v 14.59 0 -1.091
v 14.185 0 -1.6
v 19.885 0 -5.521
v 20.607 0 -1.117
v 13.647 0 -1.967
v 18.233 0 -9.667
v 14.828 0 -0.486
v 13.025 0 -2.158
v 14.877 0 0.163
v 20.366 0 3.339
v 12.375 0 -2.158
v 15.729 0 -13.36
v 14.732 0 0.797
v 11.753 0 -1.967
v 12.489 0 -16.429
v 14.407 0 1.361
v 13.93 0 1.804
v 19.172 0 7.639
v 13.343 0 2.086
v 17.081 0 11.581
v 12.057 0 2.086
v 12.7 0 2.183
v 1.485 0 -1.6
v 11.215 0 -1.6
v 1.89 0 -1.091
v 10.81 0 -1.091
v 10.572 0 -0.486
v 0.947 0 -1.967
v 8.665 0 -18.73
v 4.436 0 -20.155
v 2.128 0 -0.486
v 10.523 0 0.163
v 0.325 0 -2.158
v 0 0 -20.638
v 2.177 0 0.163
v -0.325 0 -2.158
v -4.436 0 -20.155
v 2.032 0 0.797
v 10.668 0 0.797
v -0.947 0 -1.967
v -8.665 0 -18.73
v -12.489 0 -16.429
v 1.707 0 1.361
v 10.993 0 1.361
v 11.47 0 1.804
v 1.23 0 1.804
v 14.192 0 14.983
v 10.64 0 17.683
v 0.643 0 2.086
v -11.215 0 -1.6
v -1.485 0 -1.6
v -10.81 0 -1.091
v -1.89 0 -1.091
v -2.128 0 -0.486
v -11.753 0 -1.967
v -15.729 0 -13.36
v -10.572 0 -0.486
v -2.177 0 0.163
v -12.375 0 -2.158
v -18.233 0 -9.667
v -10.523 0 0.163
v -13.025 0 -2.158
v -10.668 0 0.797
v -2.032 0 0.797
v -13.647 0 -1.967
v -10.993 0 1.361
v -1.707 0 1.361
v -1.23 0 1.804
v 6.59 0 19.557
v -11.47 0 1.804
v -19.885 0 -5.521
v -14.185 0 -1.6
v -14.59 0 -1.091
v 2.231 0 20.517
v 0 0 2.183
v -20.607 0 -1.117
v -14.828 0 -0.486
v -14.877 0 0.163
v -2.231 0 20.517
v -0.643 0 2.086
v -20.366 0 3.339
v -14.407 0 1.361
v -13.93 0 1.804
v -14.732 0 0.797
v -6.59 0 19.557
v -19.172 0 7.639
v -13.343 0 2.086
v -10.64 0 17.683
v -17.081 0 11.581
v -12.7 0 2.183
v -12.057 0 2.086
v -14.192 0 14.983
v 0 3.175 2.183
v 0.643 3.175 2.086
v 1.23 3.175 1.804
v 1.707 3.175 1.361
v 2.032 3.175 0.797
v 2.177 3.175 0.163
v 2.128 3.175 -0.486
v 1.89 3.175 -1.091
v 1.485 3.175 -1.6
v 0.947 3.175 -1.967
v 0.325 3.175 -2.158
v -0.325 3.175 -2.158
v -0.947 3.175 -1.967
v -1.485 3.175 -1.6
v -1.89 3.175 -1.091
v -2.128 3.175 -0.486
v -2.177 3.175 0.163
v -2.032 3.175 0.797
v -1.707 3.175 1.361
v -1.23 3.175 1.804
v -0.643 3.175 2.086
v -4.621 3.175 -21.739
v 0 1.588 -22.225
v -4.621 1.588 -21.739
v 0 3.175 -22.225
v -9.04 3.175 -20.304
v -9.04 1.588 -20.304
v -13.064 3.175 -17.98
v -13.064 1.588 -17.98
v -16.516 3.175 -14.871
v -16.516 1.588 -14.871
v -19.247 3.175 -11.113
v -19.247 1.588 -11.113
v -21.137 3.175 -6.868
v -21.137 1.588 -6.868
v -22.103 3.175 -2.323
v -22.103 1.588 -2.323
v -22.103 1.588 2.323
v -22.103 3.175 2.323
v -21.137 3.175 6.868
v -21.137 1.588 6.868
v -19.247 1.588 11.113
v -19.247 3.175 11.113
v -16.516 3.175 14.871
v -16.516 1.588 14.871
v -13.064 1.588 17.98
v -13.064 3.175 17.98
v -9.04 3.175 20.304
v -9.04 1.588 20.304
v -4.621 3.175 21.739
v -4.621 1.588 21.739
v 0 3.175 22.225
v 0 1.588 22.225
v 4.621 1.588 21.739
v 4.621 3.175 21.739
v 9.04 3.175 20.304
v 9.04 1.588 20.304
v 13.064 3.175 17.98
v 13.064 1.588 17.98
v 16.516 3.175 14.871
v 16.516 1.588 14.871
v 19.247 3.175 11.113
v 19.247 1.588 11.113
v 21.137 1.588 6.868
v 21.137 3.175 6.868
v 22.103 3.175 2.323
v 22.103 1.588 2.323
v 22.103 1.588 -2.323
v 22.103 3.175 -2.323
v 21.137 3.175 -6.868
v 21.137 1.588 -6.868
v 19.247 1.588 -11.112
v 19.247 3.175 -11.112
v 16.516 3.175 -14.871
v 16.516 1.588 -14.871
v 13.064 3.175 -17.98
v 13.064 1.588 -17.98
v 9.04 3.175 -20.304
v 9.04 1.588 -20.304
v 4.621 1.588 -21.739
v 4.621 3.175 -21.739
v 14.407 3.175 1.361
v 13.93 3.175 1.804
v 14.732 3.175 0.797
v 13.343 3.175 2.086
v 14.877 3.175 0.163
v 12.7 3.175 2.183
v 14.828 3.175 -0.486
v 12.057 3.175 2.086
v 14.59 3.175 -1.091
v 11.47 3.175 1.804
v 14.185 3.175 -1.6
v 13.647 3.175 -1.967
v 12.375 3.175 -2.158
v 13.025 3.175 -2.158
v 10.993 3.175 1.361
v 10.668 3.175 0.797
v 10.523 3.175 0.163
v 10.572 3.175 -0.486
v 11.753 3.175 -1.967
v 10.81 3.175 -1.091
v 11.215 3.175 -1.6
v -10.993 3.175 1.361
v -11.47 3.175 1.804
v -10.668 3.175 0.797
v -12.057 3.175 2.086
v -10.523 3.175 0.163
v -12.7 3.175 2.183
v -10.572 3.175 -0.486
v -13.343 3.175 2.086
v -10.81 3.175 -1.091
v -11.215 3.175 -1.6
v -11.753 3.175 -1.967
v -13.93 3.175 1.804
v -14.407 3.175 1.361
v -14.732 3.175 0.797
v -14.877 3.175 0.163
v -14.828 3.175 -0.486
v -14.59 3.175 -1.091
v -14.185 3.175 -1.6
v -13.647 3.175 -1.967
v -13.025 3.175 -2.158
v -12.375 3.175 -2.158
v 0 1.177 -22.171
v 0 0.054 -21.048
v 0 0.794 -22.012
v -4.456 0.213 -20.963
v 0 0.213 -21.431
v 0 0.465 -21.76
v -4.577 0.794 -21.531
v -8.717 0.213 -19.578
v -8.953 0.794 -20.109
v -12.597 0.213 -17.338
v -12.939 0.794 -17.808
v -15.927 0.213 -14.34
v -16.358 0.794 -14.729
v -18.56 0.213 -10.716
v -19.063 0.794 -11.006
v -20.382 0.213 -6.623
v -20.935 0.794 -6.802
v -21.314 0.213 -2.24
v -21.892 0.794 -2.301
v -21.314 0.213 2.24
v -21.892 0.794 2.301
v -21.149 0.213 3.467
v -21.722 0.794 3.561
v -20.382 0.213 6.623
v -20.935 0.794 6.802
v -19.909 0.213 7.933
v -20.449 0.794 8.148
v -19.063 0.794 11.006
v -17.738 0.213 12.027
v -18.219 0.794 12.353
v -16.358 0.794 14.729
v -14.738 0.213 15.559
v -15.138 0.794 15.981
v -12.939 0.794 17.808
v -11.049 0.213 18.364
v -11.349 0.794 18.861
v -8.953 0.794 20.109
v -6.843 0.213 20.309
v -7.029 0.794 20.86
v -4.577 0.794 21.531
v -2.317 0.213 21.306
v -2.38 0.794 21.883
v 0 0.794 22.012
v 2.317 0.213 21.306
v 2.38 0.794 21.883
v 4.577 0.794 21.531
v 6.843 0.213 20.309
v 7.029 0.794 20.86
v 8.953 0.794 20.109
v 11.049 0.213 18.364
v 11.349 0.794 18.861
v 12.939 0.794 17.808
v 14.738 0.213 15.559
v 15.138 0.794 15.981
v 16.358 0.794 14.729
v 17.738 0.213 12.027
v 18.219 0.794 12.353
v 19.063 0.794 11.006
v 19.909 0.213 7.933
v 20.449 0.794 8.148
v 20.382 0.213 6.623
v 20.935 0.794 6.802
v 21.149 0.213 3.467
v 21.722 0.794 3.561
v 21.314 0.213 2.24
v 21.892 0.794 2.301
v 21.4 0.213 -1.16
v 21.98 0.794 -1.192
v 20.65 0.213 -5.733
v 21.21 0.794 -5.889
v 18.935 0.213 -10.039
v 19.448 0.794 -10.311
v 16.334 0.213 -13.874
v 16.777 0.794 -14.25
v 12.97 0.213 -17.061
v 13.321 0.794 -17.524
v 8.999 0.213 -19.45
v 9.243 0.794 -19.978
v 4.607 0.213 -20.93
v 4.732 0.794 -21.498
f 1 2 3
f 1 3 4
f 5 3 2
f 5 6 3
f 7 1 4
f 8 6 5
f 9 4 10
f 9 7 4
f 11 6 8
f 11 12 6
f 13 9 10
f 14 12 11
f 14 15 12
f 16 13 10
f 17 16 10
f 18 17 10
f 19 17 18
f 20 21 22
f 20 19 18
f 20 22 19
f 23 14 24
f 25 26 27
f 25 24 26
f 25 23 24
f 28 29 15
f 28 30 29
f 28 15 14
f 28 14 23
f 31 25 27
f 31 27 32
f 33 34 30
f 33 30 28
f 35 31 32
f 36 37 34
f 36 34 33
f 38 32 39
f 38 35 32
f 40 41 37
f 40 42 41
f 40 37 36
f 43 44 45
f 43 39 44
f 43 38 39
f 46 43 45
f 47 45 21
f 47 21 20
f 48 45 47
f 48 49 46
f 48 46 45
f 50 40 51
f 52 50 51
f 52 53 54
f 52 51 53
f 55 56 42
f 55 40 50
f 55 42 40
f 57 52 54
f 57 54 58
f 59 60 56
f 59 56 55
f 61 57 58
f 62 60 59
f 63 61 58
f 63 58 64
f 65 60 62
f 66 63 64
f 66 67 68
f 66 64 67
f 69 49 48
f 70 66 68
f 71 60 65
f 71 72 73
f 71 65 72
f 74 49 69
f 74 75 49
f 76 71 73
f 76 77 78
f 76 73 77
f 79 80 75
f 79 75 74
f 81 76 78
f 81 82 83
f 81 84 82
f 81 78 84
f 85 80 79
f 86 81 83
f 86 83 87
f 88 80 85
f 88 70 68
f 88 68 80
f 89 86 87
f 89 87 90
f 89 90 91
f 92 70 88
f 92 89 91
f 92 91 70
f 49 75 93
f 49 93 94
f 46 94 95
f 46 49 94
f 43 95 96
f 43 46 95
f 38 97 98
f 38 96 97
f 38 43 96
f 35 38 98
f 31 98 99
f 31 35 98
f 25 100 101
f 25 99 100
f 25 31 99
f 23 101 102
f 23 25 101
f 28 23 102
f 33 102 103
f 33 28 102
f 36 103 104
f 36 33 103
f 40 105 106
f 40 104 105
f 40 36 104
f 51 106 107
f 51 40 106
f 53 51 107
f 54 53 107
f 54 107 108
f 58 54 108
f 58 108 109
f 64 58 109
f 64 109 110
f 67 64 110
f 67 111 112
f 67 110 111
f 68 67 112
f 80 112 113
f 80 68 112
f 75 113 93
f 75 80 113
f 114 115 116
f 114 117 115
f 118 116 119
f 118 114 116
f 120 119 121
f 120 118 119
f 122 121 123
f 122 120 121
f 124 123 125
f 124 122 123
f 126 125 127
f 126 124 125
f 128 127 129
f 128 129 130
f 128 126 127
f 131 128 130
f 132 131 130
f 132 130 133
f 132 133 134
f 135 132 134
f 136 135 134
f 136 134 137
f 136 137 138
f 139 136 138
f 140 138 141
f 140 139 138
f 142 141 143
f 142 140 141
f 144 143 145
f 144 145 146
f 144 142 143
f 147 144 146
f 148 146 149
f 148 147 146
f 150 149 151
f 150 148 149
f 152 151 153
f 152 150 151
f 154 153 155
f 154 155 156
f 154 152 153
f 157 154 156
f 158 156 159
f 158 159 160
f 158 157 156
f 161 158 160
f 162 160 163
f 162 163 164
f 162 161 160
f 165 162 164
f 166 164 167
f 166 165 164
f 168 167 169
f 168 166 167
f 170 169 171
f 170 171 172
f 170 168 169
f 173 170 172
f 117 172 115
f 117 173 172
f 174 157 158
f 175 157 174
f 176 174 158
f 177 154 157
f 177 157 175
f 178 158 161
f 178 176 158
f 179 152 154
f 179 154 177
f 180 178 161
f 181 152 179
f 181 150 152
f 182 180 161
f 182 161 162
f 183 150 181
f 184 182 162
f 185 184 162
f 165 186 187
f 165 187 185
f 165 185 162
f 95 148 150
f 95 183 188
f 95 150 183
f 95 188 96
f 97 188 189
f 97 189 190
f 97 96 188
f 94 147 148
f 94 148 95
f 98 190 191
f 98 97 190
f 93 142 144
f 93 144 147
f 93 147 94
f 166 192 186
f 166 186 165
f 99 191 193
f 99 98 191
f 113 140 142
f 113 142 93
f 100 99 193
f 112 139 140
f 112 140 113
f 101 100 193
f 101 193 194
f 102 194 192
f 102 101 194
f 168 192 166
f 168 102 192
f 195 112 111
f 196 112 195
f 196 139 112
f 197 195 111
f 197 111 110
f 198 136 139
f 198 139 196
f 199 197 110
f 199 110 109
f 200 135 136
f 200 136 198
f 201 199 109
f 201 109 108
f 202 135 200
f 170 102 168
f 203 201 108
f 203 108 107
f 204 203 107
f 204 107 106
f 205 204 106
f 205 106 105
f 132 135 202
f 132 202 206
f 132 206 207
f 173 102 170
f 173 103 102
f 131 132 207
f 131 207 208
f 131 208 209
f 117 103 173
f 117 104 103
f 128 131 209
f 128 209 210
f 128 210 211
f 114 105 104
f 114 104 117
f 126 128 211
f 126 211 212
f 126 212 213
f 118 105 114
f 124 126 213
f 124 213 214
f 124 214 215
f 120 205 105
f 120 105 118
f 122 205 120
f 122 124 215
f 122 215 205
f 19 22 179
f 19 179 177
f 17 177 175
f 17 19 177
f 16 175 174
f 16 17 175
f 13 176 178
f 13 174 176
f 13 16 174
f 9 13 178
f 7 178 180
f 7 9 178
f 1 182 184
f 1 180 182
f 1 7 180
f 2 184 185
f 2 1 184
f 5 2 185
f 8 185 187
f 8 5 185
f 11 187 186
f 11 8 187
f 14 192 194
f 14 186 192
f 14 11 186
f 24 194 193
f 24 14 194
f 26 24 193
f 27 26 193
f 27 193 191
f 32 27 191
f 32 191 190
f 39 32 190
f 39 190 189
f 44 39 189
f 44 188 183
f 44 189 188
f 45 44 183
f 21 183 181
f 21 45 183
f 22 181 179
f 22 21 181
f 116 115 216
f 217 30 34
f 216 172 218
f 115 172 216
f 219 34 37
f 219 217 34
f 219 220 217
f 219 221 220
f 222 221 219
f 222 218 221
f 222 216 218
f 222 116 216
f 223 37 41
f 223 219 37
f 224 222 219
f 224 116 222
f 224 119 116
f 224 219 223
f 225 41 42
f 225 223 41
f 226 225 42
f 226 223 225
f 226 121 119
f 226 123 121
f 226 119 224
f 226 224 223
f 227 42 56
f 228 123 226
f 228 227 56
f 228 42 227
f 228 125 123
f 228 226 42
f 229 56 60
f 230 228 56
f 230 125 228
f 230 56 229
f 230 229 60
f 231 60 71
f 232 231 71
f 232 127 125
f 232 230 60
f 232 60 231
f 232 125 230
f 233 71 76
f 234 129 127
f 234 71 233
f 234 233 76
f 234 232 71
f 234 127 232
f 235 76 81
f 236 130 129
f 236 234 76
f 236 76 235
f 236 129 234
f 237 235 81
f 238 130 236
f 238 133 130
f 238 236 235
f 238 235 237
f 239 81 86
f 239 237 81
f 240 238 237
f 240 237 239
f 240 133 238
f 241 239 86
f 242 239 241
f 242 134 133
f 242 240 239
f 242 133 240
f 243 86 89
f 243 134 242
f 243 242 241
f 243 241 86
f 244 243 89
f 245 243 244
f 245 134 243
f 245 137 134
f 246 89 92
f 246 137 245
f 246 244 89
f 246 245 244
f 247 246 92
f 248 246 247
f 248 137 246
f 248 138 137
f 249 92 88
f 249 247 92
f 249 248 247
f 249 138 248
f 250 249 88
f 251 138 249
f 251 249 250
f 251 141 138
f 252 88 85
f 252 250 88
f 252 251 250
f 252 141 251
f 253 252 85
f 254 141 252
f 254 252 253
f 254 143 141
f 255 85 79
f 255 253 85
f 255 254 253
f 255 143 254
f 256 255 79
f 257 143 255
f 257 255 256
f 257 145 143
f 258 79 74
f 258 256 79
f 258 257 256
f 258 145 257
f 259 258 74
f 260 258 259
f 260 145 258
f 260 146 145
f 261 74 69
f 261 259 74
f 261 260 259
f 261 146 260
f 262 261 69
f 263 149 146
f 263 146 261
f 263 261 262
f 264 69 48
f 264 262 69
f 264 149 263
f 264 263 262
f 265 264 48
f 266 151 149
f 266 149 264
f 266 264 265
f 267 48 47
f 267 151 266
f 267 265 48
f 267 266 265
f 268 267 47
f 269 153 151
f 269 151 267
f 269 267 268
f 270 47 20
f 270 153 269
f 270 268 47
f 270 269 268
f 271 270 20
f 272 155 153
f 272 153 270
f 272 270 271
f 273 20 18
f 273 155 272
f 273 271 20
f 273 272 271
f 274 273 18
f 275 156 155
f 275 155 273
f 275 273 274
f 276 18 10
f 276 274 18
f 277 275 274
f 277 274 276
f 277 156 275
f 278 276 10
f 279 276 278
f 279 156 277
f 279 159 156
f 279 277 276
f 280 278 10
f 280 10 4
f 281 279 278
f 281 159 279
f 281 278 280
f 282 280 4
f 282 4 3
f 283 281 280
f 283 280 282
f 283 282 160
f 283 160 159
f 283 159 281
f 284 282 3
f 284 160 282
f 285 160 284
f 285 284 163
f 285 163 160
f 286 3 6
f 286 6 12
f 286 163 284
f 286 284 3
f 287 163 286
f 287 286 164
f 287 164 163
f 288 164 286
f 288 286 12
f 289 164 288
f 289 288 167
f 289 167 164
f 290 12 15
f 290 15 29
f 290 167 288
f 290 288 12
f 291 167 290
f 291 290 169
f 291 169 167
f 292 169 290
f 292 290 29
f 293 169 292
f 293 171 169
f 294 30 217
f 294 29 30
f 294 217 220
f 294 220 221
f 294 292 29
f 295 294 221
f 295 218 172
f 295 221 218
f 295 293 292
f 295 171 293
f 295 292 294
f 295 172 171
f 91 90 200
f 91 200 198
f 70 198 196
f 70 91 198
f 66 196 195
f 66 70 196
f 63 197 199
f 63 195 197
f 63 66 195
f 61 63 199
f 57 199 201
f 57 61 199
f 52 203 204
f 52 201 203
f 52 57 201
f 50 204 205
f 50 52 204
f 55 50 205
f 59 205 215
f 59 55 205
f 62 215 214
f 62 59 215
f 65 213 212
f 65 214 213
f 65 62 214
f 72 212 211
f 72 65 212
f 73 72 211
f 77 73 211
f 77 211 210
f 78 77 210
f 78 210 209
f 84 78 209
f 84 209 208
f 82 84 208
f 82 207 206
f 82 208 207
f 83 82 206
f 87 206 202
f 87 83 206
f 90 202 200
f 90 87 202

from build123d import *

# Parameters (mm, degrees)
CUT_EXTRUDE1_DEPTH      = 32.590851198
CUT_EXTRUDE1_DEPTH_BACK = 32.590851198
SKETCH2_R               = 2.1828125


with BuildPart() as part:
    # Sketch1 → Revolve1 (revolve)
    with BuildSketch(Plane.XY, mode=Mode.PRIVATE) as revolve1_sk:
        with BuildLine():
            Line((0, 0), (20.6375, 0))
            ThreePointArc((20.6375, 0), (21.760032015, 0.464967985), (22.225, 1.5875))
            Line((22.225, 1.5875), (22.225, 3.175))
            Line((22.225, 3.175), (0, 3.175))
            Line((0, 3.175), (0, 0))
        make_face()
    revolve(revolve1_sk.sketch.rotate(Axis((0, 0, 0), (0, 1, 0)), 90), axis=Axis((0, 0, 0), (0, 1, 0)))

    # Sketch2 → Cut-Extrude1 (cut, two sides: drawn at the far end of the back side and taken through both)
    with BuildSketch(Plane(origin=(0, 3.175, 0), x_dir=(1, 0, 0), z_dir=(0, 1, 0)).offset(-CUT_EXTRUDE1_DEPTH_BACK)):
        with Locations(Location((0, 0, 0), (0, 0, 270))):
            Circle(SKETCH2_R)
        with Locations(Location((12.7, 0, 0), (0, 0, 270))):
            Circle(SKETCH2_R)
        with Locations(Location((-12.7, 0, 0), (0, 0, 270))):
            Circle(SKETCH2_R)
    extrude(amount=CUT_EXTRUDE1_DEPTH + CUT_EXTRUDE1_DEPTH_BACK, mode=Mode.SUBTRACT)


solid = part.part
